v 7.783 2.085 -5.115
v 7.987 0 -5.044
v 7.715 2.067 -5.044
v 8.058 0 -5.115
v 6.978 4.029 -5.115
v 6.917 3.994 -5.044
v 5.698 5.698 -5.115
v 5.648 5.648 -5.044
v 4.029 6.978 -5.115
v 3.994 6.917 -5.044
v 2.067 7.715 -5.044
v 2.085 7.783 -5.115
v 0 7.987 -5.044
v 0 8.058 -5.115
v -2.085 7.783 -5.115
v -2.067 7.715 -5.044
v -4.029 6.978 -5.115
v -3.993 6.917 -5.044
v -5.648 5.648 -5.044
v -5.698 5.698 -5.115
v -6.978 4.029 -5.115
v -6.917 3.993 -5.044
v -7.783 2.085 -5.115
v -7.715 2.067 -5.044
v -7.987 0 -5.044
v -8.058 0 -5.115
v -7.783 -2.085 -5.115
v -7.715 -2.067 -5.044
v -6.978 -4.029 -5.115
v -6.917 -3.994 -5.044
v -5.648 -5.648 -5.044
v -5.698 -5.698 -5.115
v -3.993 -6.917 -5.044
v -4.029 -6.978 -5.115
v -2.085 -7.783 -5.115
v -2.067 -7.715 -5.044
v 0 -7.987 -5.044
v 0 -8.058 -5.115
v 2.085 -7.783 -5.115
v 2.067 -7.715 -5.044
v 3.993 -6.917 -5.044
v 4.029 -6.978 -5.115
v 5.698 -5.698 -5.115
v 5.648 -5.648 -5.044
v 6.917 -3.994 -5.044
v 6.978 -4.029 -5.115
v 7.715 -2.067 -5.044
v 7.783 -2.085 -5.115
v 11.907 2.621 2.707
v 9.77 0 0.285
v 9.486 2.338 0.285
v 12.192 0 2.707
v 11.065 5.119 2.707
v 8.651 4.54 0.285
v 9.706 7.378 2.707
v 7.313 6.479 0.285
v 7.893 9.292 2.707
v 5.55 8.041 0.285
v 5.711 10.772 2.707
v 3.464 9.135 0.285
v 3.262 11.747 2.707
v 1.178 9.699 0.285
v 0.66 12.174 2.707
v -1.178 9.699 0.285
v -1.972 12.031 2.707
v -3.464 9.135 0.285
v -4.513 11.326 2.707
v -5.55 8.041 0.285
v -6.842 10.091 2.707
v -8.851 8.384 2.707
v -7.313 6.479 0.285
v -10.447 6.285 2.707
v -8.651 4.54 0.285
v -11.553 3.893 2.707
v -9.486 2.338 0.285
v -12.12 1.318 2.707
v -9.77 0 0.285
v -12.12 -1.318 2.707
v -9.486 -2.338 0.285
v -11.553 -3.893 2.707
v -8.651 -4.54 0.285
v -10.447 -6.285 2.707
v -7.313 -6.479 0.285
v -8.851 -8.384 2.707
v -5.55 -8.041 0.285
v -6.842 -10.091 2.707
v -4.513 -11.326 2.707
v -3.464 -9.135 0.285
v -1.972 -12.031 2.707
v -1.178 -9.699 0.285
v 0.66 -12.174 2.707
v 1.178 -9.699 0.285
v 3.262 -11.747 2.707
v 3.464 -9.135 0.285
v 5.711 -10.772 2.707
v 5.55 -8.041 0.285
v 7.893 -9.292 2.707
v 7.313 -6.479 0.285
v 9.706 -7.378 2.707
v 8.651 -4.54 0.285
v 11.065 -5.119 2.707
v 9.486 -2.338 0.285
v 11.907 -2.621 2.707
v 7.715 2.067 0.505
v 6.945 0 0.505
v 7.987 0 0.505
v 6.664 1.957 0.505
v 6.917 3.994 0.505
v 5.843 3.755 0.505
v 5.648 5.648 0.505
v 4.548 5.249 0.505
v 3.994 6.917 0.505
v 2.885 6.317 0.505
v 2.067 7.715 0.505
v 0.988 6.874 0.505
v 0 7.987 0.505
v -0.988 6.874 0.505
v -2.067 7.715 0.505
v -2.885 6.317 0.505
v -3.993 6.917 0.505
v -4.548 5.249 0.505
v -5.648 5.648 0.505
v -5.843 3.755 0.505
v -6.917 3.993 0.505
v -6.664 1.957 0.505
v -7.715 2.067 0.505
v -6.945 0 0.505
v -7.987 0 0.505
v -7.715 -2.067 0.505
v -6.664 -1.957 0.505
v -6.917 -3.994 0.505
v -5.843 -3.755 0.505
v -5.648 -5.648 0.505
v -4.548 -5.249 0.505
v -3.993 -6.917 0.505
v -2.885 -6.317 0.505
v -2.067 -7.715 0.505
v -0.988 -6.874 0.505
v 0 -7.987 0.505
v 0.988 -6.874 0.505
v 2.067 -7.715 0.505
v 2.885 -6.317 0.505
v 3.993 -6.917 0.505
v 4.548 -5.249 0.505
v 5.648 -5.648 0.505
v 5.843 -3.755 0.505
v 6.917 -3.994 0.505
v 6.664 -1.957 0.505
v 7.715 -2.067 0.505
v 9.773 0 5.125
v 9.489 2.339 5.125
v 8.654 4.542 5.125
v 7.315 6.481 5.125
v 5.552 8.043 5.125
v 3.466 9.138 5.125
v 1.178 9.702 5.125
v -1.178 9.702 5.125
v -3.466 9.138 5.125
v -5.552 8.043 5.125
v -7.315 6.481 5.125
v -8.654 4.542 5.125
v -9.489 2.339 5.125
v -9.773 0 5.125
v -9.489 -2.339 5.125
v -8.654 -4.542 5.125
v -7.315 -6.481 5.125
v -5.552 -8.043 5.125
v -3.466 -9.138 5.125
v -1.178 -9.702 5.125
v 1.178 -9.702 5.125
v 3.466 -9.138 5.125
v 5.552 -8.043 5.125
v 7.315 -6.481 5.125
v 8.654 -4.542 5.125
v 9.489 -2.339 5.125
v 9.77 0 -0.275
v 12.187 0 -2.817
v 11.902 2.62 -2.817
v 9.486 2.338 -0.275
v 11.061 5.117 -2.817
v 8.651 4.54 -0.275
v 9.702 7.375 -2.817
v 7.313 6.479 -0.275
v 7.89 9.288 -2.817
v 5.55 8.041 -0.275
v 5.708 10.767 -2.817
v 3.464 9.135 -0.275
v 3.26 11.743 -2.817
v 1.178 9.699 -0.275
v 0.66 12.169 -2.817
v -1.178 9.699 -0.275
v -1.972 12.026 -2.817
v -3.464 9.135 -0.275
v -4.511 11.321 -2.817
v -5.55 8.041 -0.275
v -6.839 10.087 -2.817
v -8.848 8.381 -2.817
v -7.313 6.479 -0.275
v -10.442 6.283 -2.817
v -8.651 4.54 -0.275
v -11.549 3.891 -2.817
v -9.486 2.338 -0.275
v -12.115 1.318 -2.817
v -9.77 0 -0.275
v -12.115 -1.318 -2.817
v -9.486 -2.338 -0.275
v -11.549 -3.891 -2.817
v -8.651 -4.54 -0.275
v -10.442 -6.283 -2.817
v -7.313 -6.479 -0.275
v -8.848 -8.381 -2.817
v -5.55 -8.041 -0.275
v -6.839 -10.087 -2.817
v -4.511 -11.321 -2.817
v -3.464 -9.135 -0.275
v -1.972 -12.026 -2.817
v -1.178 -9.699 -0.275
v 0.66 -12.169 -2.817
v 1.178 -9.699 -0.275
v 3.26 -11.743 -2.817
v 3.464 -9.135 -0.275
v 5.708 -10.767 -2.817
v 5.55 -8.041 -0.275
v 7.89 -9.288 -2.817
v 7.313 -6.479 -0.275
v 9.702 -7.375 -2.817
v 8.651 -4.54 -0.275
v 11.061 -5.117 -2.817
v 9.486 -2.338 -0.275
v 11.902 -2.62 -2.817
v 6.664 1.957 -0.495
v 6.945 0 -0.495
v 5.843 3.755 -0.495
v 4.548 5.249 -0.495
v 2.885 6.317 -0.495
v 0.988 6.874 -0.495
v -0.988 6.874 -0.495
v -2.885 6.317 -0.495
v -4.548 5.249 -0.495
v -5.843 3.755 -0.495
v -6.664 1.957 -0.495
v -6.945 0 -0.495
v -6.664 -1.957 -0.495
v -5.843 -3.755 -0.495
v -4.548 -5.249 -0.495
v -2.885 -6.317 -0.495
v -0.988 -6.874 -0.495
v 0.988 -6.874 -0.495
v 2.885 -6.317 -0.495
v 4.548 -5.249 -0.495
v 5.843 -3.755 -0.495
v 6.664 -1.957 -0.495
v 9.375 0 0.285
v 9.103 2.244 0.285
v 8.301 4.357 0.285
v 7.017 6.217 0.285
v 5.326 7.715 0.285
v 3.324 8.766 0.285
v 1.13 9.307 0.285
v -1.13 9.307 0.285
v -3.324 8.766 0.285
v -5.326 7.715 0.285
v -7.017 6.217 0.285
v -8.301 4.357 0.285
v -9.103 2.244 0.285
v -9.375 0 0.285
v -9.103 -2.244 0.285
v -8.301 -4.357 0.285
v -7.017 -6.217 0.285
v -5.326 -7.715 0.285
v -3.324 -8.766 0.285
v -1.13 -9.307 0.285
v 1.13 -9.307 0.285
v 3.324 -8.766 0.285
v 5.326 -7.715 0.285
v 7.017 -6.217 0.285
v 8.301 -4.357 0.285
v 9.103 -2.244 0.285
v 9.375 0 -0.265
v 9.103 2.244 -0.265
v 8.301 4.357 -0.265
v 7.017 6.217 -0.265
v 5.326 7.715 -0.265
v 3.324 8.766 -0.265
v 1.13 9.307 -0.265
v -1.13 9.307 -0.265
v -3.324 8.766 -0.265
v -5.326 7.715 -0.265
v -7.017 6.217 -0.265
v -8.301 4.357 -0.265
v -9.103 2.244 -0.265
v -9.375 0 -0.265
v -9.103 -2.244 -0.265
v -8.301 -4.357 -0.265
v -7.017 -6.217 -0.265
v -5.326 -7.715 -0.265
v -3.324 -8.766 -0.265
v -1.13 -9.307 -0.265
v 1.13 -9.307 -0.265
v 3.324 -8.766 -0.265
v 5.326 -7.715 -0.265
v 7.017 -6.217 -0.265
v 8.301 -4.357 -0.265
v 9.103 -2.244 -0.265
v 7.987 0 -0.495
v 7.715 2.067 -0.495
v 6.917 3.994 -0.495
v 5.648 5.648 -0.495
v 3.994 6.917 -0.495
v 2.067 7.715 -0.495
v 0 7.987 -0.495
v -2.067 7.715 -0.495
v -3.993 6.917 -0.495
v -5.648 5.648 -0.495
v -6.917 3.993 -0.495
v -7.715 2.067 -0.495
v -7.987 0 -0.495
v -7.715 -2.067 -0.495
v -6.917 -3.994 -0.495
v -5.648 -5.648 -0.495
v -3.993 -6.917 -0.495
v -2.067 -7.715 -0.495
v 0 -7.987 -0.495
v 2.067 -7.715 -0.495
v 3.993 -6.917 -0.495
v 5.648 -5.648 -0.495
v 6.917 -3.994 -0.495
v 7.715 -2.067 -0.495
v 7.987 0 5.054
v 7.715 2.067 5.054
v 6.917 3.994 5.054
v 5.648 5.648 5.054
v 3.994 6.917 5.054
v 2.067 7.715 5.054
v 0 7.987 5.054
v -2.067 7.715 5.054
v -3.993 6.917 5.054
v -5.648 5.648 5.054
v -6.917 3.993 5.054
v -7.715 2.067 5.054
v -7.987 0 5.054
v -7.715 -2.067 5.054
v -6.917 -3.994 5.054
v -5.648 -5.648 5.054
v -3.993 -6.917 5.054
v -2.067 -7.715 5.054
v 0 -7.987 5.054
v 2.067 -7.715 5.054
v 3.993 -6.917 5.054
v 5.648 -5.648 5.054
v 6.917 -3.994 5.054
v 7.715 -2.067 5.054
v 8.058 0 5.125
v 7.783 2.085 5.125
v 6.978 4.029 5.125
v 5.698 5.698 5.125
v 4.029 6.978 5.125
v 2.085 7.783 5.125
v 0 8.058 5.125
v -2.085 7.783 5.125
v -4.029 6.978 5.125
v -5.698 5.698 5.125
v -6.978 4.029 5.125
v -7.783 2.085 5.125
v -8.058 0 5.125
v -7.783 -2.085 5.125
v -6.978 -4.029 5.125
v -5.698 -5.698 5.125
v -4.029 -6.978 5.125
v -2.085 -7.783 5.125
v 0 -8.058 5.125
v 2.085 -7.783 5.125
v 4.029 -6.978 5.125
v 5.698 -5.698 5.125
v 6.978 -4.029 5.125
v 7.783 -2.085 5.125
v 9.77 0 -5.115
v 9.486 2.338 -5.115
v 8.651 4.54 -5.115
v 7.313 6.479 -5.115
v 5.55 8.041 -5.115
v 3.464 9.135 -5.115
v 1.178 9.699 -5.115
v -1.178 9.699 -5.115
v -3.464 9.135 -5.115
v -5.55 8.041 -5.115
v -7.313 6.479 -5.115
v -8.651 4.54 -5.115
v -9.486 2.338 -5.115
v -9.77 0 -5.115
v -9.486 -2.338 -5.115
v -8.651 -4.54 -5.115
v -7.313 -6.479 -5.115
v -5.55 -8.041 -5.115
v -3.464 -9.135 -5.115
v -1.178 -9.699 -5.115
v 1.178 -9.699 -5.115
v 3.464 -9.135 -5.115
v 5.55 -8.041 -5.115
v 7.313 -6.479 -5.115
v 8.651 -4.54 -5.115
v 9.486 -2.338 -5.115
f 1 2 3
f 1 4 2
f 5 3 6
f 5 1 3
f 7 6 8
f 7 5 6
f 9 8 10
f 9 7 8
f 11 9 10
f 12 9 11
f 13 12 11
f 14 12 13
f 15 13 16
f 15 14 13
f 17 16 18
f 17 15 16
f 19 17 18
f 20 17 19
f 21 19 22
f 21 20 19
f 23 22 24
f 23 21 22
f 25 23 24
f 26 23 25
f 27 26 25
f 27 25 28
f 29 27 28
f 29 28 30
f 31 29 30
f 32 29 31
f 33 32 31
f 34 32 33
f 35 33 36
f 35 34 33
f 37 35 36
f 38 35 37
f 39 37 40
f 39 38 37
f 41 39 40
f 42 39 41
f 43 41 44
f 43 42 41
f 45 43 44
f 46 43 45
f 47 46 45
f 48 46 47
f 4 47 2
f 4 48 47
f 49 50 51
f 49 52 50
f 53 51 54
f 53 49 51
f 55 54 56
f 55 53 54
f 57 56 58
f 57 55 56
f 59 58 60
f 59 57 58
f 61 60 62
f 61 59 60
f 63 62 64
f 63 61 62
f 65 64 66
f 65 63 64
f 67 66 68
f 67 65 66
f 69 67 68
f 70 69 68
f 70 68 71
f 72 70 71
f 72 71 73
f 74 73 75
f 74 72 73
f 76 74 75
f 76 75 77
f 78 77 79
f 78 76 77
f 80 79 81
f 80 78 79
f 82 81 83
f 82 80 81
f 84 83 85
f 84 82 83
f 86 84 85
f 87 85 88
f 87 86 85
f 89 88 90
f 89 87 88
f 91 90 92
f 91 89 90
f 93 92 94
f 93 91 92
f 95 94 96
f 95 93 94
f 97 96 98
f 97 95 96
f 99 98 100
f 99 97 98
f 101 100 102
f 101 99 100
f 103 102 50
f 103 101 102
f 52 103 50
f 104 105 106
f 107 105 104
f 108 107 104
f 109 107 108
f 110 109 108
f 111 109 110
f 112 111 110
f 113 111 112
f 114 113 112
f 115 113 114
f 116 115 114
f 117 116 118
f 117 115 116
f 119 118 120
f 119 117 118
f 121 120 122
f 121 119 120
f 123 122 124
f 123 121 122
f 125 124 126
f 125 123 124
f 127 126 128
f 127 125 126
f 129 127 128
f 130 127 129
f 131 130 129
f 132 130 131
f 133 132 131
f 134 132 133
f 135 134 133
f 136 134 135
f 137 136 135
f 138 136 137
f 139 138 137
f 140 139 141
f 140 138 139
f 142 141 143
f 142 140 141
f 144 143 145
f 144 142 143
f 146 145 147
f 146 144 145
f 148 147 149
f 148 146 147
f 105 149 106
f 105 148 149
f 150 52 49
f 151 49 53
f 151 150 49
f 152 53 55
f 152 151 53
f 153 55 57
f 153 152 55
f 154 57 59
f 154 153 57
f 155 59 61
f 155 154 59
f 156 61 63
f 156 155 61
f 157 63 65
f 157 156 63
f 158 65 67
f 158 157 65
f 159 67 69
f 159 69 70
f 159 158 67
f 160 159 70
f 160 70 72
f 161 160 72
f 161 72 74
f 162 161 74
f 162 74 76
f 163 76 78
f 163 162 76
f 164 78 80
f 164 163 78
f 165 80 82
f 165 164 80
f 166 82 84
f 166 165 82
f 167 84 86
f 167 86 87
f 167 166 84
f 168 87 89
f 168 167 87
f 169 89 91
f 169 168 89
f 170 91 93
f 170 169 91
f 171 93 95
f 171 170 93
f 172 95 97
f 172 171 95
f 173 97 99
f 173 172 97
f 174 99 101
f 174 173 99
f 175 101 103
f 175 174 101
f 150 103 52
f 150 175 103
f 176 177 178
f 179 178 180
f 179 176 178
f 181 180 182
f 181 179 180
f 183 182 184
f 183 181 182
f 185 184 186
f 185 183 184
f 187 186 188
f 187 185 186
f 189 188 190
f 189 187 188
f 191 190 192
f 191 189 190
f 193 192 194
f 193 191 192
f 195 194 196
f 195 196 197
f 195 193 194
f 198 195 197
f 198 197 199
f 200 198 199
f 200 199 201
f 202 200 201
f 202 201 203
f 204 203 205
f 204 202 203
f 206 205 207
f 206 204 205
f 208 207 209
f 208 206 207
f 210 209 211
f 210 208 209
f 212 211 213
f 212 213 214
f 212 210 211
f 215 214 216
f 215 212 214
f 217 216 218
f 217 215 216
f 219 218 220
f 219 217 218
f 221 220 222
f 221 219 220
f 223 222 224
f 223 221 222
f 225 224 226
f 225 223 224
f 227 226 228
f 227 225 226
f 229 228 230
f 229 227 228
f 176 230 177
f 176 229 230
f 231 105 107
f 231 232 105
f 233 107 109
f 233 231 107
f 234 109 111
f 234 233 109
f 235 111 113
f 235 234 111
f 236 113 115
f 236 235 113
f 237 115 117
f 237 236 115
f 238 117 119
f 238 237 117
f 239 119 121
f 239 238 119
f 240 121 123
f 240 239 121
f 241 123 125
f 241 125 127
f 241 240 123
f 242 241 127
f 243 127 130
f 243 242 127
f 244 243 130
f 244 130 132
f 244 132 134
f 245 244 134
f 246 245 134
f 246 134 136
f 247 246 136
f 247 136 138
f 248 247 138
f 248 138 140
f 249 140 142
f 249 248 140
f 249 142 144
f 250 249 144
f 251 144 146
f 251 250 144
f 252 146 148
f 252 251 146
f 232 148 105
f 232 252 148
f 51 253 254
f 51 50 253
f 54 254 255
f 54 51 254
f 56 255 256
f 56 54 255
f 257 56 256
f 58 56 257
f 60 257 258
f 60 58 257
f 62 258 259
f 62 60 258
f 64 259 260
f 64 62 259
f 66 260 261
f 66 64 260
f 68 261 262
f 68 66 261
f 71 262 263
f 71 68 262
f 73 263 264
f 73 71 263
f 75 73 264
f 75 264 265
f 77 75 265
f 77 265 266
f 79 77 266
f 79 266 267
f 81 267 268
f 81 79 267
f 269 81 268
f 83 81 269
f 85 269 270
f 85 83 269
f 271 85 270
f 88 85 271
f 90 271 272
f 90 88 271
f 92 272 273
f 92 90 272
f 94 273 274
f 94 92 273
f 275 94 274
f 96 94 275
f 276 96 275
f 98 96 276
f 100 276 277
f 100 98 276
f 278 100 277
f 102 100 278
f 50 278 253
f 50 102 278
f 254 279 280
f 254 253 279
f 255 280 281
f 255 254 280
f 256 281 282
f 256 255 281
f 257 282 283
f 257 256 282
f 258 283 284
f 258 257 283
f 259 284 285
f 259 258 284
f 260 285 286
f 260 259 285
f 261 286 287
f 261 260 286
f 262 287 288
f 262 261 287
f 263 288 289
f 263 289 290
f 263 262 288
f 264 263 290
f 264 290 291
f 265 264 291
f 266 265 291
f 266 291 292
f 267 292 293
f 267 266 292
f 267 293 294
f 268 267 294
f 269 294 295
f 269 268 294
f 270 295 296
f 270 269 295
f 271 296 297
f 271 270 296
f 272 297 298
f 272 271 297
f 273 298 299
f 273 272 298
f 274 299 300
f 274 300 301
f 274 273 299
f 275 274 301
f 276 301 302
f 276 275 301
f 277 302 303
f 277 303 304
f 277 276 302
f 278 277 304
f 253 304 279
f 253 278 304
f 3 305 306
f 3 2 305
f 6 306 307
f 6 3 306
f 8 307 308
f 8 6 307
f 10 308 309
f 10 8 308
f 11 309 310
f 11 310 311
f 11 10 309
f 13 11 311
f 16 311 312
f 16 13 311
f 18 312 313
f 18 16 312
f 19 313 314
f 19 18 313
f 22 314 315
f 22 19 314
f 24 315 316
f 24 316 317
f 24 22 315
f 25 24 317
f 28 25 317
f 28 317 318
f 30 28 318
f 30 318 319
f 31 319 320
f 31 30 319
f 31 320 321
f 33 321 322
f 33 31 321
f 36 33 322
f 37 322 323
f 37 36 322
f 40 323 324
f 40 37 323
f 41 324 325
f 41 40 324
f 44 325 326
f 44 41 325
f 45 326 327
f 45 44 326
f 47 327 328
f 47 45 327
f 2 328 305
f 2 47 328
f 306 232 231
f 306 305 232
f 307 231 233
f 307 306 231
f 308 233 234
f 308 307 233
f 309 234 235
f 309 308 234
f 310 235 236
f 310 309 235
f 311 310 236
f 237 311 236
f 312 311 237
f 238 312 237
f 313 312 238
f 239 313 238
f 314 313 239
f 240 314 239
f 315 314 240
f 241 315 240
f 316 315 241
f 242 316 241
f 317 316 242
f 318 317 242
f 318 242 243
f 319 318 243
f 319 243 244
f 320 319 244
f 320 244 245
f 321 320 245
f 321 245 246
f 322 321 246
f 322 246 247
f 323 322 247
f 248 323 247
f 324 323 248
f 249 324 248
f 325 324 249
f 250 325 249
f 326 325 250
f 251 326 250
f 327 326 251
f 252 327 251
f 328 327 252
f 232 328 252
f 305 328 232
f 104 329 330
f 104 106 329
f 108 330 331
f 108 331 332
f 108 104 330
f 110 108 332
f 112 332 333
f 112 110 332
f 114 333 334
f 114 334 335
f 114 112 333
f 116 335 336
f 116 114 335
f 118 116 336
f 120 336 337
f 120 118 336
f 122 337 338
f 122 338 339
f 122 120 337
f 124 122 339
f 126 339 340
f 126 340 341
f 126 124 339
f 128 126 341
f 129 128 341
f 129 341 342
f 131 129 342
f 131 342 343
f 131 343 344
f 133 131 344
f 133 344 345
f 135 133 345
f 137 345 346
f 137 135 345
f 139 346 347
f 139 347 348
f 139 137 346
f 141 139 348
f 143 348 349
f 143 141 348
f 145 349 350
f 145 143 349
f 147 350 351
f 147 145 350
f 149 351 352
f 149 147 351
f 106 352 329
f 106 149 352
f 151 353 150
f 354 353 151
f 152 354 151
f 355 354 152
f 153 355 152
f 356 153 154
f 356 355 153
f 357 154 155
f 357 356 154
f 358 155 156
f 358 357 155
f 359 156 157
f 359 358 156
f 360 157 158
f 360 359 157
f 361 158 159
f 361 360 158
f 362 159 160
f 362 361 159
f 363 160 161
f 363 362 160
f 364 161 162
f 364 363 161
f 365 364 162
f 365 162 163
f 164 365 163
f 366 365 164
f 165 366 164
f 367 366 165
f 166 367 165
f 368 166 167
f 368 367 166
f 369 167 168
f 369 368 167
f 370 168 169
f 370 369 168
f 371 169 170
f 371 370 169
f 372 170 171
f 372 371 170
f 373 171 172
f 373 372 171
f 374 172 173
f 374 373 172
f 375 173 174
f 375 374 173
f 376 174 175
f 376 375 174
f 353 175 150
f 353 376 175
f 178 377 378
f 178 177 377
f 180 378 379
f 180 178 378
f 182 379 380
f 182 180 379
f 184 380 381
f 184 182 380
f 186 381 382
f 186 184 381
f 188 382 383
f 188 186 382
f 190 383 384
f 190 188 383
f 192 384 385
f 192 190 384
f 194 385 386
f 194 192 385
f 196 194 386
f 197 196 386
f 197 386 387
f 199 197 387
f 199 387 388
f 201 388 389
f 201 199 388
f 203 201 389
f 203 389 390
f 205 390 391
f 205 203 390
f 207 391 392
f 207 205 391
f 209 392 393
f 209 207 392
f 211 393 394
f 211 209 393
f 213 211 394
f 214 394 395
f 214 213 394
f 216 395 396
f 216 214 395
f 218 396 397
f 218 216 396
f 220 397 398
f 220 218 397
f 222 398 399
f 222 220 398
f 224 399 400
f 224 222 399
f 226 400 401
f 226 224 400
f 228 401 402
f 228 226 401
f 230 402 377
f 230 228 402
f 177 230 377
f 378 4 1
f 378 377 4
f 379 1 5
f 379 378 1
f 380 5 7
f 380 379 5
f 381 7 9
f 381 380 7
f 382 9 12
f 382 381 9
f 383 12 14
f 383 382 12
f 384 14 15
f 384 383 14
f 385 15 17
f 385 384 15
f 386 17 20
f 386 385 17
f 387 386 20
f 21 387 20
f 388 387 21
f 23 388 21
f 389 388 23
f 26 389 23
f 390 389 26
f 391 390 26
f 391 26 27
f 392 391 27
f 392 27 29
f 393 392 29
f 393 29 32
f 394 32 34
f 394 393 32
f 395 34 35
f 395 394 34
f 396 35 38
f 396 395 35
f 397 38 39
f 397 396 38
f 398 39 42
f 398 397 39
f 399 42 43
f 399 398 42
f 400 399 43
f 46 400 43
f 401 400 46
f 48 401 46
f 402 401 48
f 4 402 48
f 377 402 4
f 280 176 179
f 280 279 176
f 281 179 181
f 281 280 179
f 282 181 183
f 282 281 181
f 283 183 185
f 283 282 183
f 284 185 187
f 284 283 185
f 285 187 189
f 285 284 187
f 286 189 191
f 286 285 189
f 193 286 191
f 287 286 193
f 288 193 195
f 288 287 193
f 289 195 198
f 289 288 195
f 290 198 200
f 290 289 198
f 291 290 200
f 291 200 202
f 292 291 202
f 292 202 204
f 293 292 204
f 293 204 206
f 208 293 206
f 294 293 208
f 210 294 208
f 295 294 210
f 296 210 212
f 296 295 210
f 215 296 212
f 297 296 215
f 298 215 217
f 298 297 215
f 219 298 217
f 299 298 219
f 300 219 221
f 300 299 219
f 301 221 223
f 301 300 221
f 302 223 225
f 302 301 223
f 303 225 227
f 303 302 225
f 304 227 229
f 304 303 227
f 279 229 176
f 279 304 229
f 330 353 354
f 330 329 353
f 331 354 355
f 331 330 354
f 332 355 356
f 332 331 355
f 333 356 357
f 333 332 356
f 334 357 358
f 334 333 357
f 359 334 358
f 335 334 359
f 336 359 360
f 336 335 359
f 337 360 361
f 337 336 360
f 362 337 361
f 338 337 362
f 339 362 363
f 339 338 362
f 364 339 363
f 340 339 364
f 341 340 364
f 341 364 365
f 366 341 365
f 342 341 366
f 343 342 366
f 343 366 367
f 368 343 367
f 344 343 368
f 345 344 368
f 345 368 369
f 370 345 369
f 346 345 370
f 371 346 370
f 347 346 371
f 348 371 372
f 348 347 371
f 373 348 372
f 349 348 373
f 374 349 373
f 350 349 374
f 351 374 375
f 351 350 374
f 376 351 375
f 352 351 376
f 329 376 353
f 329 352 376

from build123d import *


with BuildPart() as part:
    # Sweep1: sweep along a path in Sketch4
    with BuildLine(Plane.XY) as sweep1_path:
        CenterArc((0, 0), 2.5, 0, 360)
    # Sketch3 → Sweep1 (sweep)
    with BuildSketch(Plane(origin=(0, 0, 0), x_dir=(0, 0, -1), z_dir=(1, 0, 0))):
        Polygon((-0.505, 6.945), (0.495, 6.945), (0.495, 7.987), (5.044289322, 7.987), (5.115, 8.057710678), (5.115, 9.77), (2.817453163, 12.18689992), (0.275, 9.77), (0.265, 9.375), (-0.285, 9.375), (-0.285, 9.77), (-2.706694808, 12.191694808), (-5.125, 9.773389617), (-5.125, 8.057710678), (-5.054289322, 7.987), (-0.505, 7.987), align=None)
    sweep(path=sweep1_path.line)


solid = part.part
